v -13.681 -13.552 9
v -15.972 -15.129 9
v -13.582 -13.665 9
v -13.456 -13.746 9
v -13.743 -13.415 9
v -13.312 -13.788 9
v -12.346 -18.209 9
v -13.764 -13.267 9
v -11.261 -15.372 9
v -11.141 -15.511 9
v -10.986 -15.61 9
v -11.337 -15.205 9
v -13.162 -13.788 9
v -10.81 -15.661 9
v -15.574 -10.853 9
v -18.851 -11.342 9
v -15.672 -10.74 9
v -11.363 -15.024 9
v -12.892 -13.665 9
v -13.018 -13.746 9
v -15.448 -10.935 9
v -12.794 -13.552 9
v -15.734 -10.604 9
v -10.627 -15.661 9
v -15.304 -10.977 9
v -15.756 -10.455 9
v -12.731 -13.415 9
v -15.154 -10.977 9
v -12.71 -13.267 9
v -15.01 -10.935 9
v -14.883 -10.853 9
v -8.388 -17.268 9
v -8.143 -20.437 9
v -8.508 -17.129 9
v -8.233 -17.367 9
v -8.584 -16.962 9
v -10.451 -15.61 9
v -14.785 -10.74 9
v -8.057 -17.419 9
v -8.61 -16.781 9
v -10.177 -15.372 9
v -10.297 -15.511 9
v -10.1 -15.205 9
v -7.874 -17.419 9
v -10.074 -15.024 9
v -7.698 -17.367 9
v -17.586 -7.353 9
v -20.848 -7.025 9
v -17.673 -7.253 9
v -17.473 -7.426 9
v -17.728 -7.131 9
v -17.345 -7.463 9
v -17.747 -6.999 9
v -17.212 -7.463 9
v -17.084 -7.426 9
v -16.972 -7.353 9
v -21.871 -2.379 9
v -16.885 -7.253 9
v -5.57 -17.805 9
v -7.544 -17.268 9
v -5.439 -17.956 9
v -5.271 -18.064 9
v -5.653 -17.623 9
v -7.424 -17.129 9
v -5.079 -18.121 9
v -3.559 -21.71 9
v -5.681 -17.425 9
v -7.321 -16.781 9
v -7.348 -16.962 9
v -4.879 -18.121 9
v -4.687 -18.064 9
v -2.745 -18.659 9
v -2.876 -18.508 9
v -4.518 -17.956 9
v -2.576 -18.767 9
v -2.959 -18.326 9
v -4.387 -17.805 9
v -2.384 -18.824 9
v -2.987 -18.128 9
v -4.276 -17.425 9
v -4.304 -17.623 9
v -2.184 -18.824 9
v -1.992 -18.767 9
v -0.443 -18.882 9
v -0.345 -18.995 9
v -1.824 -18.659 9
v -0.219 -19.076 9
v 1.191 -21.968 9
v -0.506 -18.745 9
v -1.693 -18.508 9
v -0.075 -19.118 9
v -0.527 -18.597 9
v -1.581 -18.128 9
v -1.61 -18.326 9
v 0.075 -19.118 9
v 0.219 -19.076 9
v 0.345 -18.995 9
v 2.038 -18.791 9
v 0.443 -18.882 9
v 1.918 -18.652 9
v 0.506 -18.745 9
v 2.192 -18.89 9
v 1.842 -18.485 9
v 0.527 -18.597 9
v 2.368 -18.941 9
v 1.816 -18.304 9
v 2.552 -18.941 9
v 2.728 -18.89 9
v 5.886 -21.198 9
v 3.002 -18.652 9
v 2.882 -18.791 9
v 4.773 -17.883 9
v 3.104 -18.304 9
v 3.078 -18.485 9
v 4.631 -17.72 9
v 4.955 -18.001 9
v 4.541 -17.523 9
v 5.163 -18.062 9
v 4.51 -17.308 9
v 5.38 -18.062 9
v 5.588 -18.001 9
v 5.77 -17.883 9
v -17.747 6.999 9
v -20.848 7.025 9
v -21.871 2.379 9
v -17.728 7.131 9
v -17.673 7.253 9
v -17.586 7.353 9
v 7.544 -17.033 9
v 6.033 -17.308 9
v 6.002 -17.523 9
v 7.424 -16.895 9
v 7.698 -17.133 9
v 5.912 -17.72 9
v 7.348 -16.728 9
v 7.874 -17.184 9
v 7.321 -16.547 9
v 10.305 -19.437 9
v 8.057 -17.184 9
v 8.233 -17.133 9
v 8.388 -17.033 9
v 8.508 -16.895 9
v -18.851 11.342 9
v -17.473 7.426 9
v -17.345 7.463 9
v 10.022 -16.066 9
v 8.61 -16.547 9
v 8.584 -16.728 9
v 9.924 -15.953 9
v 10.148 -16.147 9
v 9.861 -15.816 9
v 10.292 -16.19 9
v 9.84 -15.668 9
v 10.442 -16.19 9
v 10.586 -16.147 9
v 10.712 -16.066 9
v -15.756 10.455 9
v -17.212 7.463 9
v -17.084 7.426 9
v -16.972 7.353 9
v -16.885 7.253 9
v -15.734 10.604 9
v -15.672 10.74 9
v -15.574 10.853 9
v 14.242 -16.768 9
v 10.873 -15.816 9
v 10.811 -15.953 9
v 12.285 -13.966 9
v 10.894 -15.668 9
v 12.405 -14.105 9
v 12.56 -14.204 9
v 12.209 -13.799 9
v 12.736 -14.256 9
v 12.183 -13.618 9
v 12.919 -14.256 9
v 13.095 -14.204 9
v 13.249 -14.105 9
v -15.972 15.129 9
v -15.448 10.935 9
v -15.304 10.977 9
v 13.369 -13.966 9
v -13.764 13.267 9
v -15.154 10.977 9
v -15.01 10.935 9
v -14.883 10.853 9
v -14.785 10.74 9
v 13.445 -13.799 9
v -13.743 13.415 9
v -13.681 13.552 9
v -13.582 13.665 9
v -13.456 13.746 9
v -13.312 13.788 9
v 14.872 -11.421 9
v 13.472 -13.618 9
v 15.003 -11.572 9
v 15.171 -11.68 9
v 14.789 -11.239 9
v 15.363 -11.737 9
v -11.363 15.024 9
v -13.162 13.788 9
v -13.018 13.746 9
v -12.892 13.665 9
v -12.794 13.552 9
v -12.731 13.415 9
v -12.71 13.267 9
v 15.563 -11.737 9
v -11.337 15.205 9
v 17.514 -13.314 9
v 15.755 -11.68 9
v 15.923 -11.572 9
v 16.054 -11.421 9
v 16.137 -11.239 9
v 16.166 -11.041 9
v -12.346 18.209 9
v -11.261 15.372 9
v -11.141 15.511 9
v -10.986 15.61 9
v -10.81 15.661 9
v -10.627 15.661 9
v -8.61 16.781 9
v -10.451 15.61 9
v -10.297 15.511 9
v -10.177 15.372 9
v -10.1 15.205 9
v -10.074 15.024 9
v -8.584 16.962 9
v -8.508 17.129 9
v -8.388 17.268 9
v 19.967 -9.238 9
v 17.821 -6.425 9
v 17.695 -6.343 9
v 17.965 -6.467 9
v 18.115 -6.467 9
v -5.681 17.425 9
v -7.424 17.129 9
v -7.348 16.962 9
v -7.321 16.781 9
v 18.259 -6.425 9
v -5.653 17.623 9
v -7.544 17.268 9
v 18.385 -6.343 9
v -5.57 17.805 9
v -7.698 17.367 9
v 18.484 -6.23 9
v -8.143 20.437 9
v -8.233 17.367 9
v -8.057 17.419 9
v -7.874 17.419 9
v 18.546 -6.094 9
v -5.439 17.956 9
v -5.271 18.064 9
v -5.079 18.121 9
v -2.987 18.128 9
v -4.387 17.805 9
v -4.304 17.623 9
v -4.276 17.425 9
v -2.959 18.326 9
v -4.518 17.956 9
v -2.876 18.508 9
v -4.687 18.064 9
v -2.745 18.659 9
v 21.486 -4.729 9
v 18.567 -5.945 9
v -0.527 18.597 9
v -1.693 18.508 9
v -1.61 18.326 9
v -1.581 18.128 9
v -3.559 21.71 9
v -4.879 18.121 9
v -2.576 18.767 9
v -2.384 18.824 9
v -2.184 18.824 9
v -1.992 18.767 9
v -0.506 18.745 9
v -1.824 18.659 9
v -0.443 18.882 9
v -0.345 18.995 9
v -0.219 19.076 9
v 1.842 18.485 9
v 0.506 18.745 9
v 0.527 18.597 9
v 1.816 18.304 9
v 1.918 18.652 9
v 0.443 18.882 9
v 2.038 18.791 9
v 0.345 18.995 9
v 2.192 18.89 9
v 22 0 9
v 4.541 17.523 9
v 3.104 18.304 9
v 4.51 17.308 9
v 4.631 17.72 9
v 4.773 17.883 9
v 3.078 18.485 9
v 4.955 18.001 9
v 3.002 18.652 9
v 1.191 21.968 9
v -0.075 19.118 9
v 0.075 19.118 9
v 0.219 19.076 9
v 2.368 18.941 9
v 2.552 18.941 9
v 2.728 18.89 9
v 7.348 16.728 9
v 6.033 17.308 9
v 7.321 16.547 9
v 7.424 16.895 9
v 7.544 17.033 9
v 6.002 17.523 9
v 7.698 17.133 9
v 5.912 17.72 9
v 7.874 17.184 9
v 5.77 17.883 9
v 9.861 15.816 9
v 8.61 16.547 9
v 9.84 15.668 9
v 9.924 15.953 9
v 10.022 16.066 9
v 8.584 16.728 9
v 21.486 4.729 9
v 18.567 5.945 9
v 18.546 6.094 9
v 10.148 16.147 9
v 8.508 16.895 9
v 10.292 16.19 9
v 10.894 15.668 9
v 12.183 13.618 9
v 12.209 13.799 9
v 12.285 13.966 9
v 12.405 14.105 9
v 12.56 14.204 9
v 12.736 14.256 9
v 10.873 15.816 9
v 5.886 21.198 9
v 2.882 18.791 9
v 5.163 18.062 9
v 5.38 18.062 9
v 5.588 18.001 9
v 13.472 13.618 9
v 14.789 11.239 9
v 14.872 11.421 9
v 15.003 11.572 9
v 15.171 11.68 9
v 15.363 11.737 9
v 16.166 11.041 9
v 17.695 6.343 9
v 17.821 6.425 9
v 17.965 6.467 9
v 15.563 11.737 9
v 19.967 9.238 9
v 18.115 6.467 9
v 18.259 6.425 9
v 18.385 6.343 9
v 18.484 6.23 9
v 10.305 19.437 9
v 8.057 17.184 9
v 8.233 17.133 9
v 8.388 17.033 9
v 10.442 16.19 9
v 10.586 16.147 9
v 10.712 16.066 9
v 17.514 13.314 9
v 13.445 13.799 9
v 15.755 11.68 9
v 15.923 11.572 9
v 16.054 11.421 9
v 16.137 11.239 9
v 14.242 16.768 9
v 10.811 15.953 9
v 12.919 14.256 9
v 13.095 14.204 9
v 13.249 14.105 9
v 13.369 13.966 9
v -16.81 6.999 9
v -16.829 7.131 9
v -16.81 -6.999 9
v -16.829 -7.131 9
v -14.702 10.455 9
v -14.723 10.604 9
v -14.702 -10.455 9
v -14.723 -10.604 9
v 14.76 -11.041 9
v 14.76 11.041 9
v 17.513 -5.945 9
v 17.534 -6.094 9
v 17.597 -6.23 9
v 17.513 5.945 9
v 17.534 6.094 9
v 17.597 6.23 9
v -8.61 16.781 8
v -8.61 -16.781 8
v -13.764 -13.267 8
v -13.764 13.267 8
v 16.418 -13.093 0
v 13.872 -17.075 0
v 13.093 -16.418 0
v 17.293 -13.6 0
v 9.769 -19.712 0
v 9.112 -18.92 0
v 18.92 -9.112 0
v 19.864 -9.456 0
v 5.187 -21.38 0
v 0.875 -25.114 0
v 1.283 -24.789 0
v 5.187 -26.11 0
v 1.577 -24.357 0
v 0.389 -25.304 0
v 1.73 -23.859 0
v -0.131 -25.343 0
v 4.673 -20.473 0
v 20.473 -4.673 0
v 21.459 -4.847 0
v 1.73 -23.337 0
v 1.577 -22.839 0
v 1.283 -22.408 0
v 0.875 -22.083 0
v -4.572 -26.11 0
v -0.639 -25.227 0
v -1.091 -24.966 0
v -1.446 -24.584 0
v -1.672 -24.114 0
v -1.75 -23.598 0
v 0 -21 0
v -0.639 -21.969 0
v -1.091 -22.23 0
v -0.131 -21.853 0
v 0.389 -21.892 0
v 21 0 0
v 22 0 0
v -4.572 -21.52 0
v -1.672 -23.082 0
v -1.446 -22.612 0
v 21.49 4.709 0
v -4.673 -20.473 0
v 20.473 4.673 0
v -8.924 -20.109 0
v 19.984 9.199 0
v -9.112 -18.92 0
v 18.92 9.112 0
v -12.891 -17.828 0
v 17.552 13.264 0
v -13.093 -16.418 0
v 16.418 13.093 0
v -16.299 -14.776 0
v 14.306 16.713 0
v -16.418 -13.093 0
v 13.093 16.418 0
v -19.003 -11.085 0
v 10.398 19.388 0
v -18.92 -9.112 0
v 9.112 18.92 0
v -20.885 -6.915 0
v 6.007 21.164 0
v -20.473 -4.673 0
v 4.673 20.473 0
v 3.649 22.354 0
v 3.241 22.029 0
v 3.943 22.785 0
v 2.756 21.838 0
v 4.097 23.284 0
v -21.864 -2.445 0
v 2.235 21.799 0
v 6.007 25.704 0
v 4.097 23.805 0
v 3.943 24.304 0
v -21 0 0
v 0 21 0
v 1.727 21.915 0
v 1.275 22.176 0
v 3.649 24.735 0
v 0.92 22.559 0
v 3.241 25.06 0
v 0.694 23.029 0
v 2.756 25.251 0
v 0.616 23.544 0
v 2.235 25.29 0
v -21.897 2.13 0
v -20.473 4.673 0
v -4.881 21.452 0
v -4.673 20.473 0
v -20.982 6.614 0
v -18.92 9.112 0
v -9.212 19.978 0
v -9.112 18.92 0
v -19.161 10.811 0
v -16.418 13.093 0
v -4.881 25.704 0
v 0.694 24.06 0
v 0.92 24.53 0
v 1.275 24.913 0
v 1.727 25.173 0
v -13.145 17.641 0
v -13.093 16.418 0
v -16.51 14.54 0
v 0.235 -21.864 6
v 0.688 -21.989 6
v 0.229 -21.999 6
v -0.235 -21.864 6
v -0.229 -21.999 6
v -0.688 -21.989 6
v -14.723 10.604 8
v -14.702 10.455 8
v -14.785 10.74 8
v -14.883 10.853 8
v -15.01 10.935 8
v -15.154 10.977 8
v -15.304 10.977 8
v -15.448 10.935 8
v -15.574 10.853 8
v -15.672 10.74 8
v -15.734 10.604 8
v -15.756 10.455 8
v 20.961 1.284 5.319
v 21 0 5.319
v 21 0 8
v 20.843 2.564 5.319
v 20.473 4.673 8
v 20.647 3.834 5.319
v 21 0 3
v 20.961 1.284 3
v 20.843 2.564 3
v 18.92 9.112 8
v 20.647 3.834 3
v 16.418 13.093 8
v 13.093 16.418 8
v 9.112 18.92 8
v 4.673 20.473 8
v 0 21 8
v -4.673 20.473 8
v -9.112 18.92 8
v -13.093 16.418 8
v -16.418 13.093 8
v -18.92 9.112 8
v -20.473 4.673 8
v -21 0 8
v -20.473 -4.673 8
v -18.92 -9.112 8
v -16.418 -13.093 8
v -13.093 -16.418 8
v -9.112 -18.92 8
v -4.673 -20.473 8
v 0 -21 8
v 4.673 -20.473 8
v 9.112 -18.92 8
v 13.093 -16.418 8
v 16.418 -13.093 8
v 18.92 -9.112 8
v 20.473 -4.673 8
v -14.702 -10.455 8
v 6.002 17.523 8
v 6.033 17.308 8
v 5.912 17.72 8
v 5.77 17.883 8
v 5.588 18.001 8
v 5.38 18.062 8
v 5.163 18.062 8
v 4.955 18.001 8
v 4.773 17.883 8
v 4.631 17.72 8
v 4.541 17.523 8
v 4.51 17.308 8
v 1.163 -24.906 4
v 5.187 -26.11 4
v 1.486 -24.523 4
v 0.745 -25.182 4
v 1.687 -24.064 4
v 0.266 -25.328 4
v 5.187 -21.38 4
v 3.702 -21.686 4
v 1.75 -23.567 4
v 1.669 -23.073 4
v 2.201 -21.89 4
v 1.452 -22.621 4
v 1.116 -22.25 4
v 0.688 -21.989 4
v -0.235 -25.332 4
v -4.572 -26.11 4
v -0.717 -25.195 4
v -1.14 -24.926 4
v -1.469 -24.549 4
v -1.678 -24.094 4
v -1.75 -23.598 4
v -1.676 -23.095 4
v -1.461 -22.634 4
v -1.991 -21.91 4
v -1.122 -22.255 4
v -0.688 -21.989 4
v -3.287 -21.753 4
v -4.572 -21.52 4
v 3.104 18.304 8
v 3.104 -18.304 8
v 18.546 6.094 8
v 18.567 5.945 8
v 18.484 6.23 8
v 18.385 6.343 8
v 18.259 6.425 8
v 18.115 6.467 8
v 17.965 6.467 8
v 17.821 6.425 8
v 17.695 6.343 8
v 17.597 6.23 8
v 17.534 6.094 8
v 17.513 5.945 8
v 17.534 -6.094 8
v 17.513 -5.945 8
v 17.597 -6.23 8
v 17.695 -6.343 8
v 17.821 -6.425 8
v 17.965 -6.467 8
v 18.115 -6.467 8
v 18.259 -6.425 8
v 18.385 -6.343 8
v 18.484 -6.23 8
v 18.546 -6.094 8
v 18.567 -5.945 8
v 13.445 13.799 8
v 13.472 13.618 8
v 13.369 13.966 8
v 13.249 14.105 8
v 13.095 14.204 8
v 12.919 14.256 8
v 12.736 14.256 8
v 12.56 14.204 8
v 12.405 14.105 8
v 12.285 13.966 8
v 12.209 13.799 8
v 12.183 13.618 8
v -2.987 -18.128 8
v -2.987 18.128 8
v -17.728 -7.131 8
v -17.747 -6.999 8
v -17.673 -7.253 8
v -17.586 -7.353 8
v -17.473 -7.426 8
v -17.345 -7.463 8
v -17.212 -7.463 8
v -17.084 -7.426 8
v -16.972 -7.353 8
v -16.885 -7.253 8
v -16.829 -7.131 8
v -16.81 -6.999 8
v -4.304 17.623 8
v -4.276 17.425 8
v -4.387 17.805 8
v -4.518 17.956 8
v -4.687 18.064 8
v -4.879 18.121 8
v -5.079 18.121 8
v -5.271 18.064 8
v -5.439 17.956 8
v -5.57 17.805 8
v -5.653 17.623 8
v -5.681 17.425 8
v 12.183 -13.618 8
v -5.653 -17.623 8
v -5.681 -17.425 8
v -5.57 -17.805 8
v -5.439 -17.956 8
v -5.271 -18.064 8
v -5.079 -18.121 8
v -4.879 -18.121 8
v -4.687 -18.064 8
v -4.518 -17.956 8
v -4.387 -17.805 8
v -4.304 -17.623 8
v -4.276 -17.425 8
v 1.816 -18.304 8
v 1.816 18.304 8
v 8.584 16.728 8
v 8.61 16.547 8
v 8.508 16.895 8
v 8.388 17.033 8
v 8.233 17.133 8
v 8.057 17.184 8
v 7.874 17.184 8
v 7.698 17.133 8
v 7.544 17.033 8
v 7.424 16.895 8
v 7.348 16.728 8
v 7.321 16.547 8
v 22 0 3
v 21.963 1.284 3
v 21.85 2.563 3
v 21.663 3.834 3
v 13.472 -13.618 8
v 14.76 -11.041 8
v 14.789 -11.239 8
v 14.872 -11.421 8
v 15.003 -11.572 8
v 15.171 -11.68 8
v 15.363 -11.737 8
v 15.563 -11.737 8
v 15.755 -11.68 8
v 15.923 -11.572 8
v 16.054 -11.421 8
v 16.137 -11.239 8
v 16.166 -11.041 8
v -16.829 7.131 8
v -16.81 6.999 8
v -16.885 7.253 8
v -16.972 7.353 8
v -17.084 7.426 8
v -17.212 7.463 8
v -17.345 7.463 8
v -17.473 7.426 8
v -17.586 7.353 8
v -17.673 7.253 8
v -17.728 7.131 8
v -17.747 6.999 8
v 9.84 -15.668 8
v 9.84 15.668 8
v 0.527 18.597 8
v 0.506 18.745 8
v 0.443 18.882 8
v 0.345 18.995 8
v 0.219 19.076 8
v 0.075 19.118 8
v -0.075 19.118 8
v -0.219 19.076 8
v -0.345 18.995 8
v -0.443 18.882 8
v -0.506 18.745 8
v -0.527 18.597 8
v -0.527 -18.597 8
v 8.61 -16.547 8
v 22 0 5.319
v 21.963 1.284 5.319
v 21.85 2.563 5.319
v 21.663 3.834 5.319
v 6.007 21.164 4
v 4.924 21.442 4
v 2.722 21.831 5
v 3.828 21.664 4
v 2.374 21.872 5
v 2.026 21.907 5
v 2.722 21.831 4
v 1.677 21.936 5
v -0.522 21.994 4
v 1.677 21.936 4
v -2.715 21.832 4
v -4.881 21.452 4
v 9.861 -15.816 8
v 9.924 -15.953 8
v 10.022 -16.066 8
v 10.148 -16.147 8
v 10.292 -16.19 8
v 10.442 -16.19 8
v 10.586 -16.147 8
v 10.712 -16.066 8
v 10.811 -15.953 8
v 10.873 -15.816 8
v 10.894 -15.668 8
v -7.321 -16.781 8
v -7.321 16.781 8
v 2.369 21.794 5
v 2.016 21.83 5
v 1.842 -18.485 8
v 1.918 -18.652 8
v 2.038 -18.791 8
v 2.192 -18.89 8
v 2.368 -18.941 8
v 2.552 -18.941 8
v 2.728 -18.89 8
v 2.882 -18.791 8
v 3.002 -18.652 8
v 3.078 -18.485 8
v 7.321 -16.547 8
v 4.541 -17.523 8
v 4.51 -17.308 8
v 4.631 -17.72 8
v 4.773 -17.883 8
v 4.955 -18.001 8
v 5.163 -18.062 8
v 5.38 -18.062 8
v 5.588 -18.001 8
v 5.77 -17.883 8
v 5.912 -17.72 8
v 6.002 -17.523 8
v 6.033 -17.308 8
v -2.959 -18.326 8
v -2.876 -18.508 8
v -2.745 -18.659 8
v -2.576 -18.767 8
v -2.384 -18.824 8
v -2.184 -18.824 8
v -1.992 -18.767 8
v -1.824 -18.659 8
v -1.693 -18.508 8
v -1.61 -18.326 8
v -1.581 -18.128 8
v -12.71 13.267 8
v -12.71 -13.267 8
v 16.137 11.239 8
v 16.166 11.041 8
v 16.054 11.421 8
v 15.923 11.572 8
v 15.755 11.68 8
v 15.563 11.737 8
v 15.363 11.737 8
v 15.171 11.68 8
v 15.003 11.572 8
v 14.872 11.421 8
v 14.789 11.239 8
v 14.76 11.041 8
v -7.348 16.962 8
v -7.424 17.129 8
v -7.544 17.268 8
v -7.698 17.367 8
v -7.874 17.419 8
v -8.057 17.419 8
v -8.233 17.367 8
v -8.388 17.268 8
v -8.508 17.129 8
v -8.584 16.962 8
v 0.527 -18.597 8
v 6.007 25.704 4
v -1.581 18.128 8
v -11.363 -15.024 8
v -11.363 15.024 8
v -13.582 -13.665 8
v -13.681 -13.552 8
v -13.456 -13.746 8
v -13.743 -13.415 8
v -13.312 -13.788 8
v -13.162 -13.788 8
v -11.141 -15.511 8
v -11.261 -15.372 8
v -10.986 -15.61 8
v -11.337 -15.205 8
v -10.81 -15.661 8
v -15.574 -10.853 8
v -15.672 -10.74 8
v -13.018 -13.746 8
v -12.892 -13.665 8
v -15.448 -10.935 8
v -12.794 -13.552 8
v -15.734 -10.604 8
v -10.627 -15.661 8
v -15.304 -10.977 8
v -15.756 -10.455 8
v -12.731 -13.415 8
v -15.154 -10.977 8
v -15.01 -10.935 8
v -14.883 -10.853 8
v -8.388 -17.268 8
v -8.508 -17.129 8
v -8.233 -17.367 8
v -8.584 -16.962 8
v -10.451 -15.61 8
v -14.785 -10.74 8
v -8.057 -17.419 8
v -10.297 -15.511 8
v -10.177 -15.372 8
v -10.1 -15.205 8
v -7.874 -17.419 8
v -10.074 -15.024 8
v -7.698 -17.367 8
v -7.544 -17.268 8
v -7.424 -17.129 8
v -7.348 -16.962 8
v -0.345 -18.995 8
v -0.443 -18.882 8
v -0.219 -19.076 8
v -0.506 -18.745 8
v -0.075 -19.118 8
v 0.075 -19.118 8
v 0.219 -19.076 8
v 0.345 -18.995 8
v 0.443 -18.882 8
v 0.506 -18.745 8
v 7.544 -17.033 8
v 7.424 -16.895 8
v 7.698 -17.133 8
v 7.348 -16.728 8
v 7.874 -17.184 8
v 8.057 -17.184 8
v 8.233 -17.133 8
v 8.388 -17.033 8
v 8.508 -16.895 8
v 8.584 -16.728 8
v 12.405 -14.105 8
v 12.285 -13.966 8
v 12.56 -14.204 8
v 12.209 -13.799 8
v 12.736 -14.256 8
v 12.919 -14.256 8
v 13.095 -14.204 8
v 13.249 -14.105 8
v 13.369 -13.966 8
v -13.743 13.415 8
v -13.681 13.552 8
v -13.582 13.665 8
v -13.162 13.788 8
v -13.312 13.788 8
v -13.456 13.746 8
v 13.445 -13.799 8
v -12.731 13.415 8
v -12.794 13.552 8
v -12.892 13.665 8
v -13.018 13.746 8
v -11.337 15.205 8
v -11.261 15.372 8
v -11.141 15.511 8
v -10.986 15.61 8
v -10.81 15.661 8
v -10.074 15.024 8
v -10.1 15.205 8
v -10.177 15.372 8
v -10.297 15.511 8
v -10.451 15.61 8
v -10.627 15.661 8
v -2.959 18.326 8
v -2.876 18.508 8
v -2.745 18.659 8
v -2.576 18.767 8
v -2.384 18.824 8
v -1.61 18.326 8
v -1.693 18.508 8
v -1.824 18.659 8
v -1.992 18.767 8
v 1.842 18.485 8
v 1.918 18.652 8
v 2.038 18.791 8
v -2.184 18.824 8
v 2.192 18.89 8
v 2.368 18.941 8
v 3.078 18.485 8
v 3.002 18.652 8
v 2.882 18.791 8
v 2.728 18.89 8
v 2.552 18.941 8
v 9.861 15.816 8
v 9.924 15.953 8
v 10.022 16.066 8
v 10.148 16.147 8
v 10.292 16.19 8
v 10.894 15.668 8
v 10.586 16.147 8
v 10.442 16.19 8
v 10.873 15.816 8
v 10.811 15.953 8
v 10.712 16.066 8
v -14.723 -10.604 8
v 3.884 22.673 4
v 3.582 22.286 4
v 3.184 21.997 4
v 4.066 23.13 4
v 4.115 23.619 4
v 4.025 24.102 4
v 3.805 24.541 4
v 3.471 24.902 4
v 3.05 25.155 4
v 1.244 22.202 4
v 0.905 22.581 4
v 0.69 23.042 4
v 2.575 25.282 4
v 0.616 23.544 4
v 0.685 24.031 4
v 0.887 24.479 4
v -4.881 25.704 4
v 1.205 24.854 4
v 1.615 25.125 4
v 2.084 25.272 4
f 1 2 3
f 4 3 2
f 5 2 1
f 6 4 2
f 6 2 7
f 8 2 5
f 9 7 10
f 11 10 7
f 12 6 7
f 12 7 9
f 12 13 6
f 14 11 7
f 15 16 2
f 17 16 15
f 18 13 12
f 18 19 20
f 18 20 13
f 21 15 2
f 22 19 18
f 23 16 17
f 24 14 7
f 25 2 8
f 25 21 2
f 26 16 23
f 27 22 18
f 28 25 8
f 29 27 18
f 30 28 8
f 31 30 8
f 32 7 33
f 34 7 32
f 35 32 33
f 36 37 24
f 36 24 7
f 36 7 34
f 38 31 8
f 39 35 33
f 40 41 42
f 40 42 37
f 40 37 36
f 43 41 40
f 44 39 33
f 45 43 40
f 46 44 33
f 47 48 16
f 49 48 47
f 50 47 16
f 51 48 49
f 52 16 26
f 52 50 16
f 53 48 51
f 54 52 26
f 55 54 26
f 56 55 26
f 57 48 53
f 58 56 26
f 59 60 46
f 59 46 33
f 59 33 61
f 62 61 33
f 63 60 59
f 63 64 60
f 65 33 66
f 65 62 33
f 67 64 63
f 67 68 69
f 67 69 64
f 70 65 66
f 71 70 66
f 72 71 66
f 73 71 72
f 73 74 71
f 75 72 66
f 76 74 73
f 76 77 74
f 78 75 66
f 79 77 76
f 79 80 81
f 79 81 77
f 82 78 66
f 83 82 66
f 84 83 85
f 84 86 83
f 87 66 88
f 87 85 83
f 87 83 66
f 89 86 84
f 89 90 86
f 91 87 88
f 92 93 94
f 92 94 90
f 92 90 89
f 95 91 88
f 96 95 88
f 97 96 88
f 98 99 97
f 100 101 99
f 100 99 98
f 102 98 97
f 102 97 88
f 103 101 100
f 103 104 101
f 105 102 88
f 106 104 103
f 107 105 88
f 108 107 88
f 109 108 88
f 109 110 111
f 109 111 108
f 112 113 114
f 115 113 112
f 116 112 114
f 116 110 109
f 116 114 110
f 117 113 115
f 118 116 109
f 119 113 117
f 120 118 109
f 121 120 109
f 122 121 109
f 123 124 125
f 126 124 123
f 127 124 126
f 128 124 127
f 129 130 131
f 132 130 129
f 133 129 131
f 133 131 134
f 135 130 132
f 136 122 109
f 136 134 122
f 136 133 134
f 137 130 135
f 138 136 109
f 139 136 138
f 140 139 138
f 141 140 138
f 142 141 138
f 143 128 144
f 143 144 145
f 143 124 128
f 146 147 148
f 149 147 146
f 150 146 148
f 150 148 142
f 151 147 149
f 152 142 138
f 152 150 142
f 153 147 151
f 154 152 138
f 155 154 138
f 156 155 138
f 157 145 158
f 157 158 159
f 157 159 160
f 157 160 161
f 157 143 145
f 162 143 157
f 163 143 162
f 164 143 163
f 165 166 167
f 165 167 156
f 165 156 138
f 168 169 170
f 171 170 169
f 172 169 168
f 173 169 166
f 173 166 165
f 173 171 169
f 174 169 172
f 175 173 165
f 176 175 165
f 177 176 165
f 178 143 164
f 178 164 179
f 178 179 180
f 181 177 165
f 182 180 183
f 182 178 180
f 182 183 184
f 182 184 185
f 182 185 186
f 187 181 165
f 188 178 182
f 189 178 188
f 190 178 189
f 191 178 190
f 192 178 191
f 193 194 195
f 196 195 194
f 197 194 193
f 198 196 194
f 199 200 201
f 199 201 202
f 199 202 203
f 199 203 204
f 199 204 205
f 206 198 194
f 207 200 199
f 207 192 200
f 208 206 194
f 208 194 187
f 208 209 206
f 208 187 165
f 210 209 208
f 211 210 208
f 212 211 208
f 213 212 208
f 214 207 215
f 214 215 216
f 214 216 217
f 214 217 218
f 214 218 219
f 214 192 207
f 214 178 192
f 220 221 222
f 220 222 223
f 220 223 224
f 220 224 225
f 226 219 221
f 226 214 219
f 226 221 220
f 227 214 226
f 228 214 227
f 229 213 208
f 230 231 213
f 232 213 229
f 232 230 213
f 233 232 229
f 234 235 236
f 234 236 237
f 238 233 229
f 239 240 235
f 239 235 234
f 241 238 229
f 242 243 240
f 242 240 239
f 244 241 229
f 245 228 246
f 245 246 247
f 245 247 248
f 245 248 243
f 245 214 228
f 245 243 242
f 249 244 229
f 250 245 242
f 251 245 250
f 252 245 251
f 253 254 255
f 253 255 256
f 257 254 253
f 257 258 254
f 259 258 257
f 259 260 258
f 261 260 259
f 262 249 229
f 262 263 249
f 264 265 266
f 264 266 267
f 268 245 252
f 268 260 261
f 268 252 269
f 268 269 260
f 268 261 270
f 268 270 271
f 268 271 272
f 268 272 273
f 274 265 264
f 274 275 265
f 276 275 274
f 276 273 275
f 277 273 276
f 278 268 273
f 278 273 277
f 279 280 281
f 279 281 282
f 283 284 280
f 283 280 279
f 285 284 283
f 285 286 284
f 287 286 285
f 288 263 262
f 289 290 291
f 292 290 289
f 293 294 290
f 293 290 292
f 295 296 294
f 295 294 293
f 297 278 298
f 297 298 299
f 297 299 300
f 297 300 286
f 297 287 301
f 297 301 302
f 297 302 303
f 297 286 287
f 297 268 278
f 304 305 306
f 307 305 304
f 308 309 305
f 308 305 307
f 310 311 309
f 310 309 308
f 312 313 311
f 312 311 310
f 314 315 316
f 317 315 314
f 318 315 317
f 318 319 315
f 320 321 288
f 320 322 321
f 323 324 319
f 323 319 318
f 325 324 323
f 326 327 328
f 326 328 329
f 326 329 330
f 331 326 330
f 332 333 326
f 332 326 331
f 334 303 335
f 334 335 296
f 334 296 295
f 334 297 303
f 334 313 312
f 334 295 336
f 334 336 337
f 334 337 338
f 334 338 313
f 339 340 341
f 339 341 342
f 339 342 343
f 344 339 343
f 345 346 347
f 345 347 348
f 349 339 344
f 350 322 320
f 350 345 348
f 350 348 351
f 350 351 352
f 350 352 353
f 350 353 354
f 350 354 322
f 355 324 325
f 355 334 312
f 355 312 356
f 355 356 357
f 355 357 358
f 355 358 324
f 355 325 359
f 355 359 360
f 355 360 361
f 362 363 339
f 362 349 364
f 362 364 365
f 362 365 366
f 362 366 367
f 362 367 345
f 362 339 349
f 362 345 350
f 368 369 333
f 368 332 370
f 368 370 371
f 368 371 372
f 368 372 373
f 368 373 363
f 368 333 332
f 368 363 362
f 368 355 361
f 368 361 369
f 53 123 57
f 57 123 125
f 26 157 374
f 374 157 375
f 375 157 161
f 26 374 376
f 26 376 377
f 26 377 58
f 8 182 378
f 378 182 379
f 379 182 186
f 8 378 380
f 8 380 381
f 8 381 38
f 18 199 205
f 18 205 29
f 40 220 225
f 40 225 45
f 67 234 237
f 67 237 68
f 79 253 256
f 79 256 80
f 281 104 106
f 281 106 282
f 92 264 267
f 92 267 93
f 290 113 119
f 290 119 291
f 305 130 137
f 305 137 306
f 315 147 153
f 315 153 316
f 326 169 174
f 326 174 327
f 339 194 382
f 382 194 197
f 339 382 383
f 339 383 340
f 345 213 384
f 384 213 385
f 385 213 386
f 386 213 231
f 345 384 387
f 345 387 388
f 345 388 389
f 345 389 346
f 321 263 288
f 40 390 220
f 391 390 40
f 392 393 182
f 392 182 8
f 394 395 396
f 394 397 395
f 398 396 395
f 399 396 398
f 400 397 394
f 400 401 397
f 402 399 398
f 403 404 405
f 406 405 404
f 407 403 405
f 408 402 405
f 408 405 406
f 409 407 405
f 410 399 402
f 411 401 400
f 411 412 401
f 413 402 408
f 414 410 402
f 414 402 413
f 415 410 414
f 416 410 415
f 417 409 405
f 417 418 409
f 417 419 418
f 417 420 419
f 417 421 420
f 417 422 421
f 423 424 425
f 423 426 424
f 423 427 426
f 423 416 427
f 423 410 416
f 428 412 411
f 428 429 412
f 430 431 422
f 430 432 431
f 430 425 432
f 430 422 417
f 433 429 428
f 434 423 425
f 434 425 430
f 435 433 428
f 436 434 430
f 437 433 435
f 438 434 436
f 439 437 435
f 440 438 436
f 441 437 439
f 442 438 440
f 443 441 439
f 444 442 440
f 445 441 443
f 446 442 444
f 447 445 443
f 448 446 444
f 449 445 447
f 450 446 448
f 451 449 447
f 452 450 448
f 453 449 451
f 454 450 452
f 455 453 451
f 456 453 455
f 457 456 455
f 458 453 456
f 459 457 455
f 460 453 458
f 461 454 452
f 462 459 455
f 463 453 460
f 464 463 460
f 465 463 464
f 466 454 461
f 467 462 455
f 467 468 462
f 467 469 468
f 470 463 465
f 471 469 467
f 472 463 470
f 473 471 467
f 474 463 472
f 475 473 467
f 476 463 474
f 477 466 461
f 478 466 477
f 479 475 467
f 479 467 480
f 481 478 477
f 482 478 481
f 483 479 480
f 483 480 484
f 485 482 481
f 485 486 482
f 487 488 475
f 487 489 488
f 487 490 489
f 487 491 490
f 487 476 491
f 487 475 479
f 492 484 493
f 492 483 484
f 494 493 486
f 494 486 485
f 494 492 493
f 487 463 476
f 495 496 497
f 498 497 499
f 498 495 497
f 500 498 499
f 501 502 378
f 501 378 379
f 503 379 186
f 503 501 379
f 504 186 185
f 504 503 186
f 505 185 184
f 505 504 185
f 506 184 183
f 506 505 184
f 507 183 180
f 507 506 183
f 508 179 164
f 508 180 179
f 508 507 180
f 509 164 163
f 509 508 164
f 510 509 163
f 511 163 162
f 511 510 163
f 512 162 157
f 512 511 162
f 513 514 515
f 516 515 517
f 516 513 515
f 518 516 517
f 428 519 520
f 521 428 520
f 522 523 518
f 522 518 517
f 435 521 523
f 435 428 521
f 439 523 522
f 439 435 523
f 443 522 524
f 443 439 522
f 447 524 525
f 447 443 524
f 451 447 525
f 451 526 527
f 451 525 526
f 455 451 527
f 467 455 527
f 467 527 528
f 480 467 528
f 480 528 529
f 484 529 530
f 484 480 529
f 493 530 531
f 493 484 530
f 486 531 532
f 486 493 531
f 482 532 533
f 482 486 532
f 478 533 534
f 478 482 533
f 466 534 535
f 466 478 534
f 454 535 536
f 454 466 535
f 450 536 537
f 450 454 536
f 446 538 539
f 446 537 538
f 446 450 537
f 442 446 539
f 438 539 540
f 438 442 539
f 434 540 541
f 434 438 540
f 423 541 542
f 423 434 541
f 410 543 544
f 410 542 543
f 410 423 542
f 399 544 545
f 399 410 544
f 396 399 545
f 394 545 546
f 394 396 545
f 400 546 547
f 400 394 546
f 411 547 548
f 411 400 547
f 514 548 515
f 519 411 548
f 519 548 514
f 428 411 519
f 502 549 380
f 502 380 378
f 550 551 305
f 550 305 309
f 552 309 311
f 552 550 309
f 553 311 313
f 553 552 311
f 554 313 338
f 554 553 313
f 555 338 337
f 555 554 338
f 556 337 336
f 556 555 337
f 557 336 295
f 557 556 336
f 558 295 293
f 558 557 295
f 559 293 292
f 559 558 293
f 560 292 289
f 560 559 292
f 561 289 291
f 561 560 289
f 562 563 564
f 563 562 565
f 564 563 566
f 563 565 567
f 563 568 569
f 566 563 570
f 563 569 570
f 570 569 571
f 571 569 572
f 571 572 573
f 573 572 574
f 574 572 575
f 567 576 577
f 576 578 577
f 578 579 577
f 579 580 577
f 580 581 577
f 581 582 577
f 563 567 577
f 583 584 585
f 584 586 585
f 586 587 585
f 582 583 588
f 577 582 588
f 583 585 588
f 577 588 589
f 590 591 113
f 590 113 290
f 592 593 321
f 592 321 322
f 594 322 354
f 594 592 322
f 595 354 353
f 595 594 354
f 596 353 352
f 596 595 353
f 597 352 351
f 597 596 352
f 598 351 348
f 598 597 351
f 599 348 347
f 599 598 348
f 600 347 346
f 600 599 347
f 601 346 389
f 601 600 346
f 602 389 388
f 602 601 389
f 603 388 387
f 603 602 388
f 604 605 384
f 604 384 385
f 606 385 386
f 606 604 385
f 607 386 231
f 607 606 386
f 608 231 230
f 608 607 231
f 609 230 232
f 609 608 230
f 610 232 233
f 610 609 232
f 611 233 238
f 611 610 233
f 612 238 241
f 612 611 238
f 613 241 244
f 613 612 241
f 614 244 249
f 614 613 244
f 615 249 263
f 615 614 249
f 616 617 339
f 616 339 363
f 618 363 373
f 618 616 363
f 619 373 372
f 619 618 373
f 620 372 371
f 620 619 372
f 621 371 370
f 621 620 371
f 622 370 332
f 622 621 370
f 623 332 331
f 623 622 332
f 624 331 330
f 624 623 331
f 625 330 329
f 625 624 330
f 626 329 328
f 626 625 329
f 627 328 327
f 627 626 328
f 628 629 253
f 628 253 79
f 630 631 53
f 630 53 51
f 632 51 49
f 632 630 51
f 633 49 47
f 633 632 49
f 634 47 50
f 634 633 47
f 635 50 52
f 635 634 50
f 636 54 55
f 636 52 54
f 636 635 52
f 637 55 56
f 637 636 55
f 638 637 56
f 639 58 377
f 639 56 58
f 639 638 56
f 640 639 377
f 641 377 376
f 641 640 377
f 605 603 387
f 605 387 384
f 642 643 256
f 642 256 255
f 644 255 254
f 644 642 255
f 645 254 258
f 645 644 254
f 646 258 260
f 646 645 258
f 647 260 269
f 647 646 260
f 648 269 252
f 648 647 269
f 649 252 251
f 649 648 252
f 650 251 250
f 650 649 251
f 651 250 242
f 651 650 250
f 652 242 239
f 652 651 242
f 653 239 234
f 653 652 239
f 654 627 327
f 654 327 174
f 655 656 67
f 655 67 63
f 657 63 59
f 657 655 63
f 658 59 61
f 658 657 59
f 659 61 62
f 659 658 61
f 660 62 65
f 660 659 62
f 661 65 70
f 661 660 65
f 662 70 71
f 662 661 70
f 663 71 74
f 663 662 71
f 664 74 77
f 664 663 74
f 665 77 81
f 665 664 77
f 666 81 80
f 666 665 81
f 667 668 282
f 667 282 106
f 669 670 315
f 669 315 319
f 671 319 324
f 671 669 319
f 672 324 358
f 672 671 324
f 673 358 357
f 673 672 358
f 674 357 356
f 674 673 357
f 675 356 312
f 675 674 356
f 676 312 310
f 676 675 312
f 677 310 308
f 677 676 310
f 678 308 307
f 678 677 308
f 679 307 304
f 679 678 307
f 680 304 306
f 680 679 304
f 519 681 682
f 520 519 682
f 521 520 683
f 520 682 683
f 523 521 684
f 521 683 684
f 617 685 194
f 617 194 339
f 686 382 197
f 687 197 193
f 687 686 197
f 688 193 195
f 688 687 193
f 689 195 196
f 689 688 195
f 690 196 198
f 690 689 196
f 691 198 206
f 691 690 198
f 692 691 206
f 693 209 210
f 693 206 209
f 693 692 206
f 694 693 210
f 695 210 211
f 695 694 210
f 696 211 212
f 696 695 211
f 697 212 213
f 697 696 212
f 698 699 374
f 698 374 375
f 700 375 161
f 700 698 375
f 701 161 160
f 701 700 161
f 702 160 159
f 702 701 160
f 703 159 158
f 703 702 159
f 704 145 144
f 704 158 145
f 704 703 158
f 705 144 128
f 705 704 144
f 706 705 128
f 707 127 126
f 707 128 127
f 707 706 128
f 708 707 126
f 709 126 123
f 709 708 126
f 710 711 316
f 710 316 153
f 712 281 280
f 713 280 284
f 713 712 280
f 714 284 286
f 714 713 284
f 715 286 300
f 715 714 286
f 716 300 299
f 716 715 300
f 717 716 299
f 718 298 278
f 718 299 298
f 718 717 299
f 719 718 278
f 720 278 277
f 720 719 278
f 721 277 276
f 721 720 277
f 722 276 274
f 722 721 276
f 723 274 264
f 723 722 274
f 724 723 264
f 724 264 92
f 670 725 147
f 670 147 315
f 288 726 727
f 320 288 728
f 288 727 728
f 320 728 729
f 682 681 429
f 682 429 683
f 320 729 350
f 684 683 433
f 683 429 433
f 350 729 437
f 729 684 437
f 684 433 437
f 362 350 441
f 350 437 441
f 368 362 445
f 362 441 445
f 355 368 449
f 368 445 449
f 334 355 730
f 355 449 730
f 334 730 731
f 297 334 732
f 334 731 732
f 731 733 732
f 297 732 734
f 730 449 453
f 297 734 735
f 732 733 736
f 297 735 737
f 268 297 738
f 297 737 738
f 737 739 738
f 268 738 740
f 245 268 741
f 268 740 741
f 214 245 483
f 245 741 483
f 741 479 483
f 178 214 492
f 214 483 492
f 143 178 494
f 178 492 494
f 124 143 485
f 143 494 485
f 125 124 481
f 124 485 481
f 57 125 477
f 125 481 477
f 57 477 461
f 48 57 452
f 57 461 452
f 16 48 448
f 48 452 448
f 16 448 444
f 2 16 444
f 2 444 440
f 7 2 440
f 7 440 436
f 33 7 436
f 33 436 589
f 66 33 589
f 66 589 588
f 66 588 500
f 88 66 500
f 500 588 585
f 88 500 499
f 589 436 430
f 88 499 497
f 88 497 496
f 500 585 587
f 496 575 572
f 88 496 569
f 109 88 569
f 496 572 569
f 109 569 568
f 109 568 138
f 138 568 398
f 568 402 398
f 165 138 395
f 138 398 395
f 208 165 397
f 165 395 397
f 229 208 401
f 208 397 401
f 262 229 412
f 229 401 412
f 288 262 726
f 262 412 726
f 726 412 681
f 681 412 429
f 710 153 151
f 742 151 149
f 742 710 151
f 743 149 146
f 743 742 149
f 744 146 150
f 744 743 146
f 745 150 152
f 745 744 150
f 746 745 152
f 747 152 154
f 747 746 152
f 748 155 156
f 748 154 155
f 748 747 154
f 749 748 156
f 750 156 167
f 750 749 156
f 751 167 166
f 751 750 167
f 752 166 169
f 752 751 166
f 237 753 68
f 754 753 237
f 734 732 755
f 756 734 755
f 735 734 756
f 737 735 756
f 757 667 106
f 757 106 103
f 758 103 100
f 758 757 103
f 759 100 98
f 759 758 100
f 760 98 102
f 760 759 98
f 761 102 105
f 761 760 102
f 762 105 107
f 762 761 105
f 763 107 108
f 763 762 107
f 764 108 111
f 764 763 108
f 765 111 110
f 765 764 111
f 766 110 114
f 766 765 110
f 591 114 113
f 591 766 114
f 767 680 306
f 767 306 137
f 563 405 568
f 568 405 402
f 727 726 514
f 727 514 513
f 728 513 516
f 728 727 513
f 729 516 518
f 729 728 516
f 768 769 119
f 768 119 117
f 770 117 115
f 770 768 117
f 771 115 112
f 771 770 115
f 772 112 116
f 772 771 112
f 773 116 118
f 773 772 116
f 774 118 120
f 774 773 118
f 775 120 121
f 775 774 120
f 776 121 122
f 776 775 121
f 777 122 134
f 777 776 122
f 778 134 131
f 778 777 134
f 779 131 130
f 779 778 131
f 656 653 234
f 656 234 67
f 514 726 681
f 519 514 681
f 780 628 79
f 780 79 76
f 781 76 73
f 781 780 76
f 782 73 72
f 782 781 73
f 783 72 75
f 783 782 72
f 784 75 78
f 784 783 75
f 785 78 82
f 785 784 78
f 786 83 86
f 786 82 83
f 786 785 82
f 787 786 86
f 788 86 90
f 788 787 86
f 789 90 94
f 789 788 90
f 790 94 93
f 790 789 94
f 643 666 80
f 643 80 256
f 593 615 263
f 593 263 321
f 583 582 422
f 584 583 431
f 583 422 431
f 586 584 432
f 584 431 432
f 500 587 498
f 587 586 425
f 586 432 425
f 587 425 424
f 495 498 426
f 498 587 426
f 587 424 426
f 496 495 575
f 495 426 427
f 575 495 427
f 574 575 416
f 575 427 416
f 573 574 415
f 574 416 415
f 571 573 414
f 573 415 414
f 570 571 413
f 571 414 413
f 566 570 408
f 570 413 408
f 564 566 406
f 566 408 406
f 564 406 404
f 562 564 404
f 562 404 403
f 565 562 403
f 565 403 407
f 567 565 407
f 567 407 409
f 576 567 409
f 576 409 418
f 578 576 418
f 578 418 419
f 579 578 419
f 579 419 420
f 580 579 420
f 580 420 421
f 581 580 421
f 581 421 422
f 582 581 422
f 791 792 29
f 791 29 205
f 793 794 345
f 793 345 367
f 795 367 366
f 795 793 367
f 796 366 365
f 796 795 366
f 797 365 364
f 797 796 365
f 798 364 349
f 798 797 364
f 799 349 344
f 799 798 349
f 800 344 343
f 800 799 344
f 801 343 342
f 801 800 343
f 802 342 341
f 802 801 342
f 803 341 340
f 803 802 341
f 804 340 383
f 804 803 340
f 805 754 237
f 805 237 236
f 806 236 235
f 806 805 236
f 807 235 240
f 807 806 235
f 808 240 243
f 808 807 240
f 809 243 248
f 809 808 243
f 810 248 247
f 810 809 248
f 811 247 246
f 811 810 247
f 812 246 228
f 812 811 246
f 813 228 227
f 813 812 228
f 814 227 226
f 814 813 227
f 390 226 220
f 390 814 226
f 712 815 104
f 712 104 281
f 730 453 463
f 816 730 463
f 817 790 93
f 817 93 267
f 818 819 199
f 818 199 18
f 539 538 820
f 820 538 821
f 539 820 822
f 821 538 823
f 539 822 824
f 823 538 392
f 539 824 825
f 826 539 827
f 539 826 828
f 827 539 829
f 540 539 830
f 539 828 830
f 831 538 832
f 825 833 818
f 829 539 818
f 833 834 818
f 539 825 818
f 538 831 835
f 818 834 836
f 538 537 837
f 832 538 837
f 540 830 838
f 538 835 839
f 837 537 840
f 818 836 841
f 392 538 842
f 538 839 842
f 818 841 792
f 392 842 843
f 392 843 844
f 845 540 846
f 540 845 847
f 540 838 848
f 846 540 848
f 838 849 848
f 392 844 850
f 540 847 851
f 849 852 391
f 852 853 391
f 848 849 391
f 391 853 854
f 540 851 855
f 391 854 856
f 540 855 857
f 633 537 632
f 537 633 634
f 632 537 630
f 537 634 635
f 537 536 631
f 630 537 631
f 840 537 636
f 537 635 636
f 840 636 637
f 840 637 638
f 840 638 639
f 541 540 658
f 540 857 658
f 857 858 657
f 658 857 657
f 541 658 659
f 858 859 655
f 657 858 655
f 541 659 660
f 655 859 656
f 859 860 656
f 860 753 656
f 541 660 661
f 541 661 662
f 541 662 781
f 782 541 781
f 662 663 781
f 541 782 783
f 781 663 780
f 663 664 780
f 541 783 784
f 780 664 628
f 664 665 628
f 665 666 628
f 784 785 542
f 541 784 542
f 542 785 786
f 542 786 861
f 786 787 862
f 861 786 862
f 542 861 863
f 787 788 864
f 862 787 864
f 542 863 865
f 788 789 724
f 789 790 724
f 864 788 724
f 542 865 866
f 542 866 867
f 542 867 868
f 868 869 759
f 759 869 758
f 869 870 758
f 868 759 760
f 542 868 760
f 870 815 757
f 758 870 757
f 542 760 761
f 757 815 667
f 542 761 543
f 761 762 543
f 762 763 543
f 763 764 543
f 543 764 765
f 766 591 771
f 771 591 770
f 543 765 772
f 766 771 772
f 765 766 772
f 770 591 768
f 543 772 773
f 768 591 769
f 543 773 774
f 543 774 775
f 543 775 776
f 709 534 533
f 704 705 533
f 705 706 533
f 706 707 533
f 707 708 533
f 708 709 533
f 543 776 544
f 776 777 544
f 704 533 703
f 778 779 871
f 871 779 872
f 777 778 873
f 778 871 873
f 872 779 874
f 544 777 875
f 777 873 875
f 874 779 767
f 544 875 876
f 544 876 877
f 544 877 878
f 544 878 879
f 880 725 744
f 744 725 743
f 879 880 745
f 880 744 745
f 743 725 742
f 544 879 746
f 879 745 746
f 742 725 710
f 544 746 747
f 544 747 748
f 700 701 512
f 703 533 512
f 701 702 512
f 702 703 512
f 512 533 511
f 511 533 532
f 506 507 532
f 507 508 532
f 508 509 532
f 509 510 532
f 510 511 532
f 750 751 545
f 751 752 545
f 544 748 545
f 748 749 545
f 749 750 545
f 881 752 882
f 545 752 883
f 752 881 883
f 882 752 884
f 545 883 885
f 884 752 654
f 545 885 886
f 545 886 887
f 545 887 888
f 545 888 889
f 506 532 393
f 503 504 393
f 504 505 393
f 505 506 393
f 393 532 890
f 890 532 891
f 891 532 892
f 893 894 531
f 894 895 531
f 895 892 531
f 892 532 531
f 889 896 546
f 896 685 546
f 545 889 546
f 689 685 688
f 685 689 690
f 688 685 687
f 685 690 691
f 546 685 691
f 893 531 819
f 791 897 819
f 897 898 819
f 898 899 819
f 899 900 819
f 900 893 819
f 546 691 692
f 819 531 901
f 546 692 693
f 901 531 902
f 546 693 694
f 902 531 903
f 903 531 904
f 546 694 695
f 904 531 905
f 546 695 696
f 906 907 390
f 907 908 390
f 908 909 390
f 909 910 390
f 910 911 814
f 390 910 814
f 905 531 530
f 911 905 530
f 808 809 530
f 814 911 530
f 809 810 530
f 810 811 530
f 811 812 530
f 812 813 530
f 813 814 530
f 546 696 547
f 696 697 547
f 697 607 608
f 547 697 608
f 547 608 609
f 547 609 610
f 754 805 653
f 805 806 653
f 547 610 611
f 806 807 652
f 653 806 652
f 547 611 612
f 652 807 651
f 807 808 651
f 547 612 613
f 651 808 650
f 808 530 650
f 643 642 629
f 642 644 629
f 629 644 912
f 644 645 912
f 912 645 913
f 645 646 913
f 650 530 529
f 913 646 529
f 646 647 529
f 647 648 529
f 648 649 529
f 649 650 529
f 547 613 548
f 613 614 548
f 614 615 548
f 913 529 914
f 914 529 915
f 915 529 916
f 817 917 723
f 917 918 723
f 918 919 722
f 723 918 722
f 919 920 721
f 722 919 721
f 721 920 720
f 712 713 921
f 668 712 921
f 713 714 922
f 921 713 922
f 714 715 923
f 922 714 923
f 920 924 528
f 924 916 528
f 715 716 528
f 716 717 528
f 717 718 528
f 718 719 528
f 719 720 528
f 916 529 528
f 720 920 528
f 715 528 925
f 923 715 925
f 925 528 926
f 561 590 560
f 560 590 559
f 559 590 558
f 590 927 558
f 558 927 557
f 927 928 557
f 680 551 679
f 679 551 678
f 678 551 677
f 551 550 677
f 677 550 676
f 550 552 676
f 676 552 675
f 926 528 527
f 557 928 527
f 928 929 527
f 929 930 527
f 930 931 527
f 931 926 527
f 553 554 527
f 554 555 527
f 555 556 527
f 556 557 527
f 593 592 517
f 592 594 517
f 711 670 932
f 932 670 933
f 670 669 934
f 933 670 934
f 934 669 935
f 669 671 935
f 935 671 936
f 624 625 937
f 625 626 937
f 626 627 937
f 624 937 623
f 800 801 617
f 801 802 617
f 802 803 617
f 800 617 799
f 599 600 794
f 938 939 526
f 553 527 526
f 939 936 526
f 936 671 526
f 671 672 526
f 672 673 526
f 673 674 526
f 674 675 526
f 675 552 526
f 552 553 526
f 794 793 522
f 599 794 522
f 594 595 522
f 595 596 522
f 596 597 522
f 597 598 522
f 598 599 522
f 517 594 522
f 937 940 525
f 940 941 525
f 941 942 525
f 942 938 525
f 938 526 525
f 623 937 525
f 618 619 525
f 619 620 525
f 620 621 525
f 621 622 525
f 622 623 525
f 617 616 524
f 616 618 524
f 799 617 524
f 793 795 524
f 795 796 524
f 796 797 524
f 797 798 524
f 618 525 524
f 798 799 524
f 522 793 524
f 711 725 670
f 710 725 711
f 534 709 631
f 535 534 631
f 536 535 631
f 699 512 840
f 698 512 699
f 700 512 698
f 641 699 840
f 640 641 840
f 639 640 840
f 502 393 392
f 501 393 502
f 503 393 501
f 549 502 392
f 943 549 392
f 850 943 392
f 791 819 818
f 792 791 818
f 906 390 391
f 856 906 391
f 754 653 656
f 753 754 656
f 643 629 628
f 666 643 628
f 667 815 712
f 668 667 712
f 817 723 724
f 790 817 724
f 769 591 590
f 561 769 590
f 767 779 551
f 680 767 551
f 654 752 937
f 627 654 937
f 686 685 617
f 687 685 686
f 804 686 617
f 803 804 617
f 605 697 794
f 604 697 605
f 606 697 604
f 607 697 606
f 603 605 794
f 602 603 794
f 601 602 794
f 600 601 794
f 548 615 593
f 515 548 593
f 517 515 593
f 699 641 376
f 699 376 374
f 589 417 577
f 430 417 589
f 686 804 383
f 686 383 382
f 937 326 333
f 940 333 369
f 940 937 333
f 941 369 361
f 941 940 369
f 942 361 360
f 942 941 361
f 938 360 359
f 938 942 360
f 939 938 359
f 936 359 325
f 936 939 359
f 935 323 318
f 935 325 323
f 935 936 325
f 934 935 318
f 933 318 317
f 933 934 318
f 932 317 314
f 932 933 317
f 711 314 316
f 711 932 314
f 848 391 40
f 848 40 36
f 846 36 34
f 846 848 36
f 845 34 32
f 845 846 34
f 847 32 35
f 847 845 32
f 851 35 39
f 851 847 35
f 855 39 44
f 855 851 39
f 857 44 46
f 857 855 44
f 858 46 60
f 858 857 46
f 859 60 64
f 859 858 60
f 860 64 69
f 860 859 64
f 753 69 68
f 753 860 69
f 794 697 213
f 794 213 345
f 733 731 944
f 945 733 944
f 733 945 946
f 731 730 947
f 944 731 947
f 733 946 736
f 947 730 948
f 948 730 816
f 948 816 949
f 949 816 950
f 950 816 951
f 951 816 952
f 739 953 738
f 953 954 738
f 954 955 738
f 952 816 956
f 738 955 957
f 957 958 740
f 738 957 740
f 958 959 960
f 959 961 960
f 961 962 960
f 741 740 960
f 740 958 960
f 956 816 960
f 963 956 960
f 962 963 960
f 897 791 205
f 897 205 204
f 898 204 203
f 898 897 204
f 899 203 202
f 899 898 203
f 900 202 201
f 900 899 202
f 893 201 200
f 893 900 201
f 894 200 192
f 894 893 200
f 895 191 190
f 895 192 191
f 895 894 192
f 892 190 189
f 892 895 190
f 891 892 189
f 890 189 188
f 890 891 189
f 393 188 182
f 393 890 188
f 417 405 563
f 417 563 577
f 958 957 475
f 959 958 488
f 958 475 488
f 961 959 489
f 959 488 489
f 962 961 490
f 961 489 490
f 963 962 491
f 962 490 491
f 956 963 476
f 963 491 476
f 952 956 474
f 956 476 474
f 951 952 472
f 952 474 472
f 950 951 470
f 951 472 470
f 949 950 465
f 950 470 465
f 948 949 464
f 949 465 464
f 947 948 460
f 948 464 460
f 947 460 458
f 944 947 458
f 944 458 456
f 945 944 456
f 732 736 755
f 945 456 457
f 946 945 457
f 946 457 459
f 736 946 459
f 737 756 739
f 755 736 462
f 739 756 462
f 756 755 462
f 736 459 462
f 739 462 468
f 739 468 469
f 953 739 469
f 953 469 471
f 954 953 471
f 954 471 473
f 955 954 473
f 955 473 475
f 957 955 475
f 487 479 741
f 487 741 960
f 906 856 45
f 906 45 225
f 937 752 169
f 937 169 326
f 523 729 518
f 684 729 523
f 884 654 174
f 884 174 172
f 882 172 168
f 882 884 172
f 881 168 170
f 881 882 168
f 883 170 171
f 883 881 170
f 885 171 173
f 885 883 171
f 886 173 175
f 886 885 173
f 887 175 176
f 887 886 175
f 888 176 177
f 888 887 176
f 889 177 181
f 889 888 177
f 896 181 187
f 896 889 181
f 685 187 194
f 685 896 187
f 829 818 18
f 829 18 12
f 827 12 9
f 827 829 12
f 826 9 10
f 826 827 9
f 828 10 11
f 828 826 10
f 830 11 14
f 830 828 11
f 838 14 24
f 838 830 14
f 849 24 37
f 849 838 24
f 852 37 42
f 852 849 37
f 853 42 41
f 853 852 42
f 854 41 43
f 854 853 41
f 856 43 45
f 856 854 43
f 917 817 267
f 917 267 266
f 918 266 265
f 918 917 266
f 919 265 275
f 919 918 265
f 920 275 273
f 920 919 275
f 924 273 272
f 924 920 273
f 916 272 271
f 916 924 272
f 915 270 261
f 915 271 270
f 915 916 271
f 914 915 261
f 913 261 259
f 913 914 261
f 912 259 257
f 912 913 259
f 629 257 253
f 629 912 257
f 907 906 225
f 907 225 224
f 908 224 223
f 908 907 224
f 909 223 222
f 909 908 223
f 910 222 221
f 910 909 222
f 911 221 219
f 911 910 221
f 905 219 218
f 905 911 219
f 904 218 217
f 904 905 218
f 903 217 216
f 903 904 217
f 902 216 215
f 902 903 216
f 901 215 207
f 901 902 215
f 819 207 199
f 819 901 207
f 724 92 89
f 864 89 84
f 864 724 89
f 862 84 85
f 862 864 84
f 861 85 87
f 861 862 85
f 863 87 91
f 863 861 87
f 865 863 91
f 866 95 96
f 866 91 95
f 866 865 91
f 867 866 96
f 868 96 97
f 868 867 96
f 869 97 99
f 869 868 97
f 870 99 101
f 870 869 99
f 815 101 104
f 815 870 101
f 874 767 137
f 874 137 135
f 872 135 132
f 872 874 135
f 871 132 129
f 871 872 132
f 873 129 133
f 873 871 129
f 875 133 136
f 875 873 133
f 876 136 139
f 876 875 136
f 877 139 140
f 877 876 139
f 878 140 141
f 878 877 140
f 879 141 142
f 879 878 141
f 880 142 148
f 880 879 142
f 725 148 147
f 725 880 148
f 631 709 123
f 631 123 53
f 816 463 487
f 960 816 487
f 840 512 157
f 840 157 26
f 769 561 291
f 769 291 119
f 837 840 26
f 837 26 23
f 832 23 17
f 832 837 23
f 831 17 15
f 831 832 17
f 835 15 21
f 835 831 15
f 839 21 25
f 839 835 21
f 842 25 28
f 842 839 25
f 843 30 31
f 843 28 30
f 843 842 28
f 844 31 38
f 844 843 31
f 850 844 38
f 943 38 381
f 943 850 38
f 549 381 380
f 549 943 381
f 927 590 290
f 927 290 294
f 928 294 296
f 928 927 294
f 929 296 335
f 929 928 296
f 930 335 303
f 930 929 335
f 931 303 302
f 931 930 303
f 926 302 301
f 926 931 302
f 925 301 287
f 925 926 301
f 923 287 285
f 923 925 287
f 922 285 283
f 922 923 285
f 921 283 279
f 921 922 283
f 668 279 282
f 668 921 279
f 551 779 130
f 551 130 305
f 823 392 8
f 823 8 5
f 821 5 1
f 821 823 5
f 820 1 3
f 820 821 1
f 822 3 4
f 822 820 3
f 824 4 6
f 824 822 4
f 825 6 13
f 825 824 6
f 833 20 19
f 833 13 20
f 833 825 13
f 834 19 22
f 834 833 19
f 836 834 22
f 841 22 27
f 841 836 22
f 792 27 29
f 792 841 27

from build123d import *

# Parameters (mm, degrees)
SKETCH1_R           = 22
BOSS_EXTRUDE1_DEPTH = 9
SHELL2_T            = -1
CUT_EXTRUDE1_DEPTH  = 5
CUT_EXTRUDE2_DEPTH  = 5
SKETCH24_W          = 2.319445398
SKETCH24_H          = 3.83352781
CUT_EXTRUDE3_DEPTH  = 5
SKETCH25_W          = 10.887577437
SKETCH25_H          = 4.540244535
BOSS_EXTRUDE2_DEPTH = 4
SKETCH26_R          = 1.75
CUT_EXTRUDE4_DEPTH  = 5
SKETCH27_W          = 9.75823175
SKETCH27_H          = 4.730401218
BOSS_EXTRUDE3_DEPTH = 4
SKETCH28_R          = 1.75
CUT_EXTRUDE5_DEPTH  = 6


with BuildPart() as part:
    # Sketch1 → Boss-Extrude1 (new body)
    with BuildSketch(Plane.XY):
        Circle(SKETCH1_R)
    extrude(amount=BOSS_EXTRUDE1_DEPTH)

    # Shell2
    shell2_openings = [part.faces().sort_by_distance(p)[0] for p in [
        (0, 0, 0),
    ]]
    offset(amount=SHELL2_T, openings=shell2_openings, kind=Kind.INTERSECTION)

    # Sketch23 → Cut-Extrude1 (cut)
    with BuildSketch(Plane(origin=(0, 0, 8), x_dir=(-1, 0, 0), z_dir=(0, 0, -1))):
        with BuildLine():
            Line((-3.104308234, -18.303704212), (-3.104308234, 18.303704212))
            ThreePointArc((-3.104308234, 18.303704212), (-2.460017846, 18.9479946), (-1.815727458, 18.303704212))
            Line((-1.815727458, 18.303704212), (-1.815727458, -18.303704212))
            ThreePointArc((-1.815727458, -18.303704212), (-2.460017846, -18.9479946), (-3.104308234, -18.303704212))
        make_face()
        with BuildLine():
            Line((-6.032900908, -17.307982703), (-6.032900908, 17.307982703))
            ThreePointArc((-6.032900908, 17.307982703), (-5.271466813, 18.069416798), (-4.510032718, 17.307982703))
            Line((-4.510032718, 17.307982703), (-4.510032718, -17.307982703))
            ThreePointArc((-4.510032718, -17.307982703), (-5.271466813, -18.069416798), (-6.032900908, -17.307982703))
        make_face()
        with BuildLine():
            Line((-8.610062461, -16.546548608), (-8.610062461, 16.546548608))
            ThreePointArc((-8.610062461, 16.546548608), (-7.965772073, 17.190838996), (-7.321481685, 16.546548608))
            Line((-7.321481685, 16.546548608), (-7.321481685, -16.546548608))
            ThreePointArc((-7.321481685, -16.546548608), (-7.965772073, -17.190838996), (-8.610062461, -16.546548608))
        make_face()
        with BuildLine():
            Line((-10.894364747, -15.667970806), (-10.894364747, 15.667970806))
            ThreePointArc((-10.894364747, 15.667970806), (-10.367218066, 16.195117487), (-9.840071384, 15.667970806))
            Line((-9.840071384, 15.667970806), (-9.840071384, -15.667970806))
            ThreePointArc((-9.840071384, -15.667970806), (-10.367218066, -16.195117487), (-10.894364747, -15.667970806))
        make_face()
        with BuildLine():
            Line((-13.4715263, -13.617955934), (-13.4715263, 13.617955934))
            ThreePointArc((-13.4715263, 13.617955934), (-12.827235912, 14.262246322), (-12.182945524, 13.617955934))
            Line((-12.182945524, 13.617955934), (-12.182945524, -13.617955934))
            ThreePointArc((-12.182945524, -13.617955934), (-12.827235912, -14.262246322), (-13.4715263, -13.617955934))
        make_face()
        with BuildLine():
            Line((-16.16583156, -11.040794381), (-16.16583156, 11.040794381))
            ThreePointArc((-16.16583156, 11.040794381), (-15.462969318, 11.743656623), (-14.760107077, 11.040794381))
            Line((-14.760107077, 11.040794381), (-14.760107077, -11.040794381))
            ThreePointArc((-14.760107077, -11.040794381), (-15.462969318, -11.743656623), (-16.16583156, -11.040794381))
        make_face()
        with BuildLine():
            Line((-18.567277553, -5.945043128), (-18.567277553, 5.945043128))
            ThreePointArc((-18.567277553, 5.945043128), (-18.040130871, 6.472189809), (-17.51298419, 5.945043128))
            Line((-17.51298419, 5.945043128), (-17.51298419, -5.945043128))
            ThreePointArc((-17.51298419, -5.945043128), (-18.040130871, -6.472189809), (-18.567277553, -5.945043128))
        make_face()
    extrude(amount=-CUT_EXTRUDE1_DEPTH, mode=Mode.SUBTRACT)

    # Sketch22 → Cut-Extrude2 (cut)
    with BuildSketch(Plane(origin=(0, 0, 8), x_dir=(-1, 0, 0), z_dir=(0, 0, -1))):
        with BuildLine():
            Line((-0.527146681, -18.59656348), (-0.527146681, 18.59656348))
            ThreePointArc((-0.527146681, 18.59656348), (0, 19.123710161), (0.527146681, 18.59656348))
            Line((0.527146681, 18.59656348), (0.527146681, -18.59656348))
            ThreePointArc((0.527146681, -18.59656348), (0, -19.123710161), (-0.527146681, -18.59656348))
        make_face()
        with BuildLine():
            Line((1.581440044, -18.127988652), (1.581440044, 18.127988652))
            ThreePointArc((1.581440044, 18.127988652), (2.284302286, 18.830850893), (2.987164527, 18.127988652))
            Line((2.987164527, 18.127988652), (2.987164527, -18.127988652))
            ThreePointArc((2.987164527, -18.127988652), (2.284302286, -18.830850893), (1.581440044, -18.127988652))
        make_face()
        with BuildLine():
            Line((4.275745304, -17.42512641), (4.275745304, 17.42512641))
            ThreePointArc((4.275745304, 17.42512641), (4.978607546, 18.127988652), (5.681469787, 17.42512641))
            Line((5.681469787, 17.42512641), (5.681469787, -17.42512641))
            ThreePointArc((5.681469787, -17.42512641), (4.978607546, -18.127988652), (4.275745304, -17.42512641))
        make_face()
        with BuildLine():
            Line((7.321481685, -16.780836022), (7.321481685, 16.780836022))
            ThreePointArc((7.321481685, 16.780836022), (7.965772073, 17.42512641), (8.610062461, 16.780836022))
            Line((8.610062461, 16.780836022), (8.610062461, -16.780836022))
            ThreePointArc((8.610062461, -16.780836022), (7.965772073, -17.42512641), (7.321481685, -16.780836022))
        make_face()
        with BuildLine():
            Line((10.074358798, -15.023680417), (10.074358798, 15.023680417))
            ThreePointArc((10.074358798, 15.023680417), (10.718649187, 15.667970806), (11.362939575, 15.023680417))
            Line((11.362939575, 15.023680417), (11.362939575, -15.023680417))
            ThreePointArc((11.362939575, -15.023680417), (10.718649187, -15.667970806), (10.074358798, -15.023680417))
        make_face()
        with BuildLine():
            Line((12.710092205, -13.266524813), (12.710092205, 13.266524813))
            ThreePointArc((12.710092205, 13.266524813), (13.237238886, 13.793671494), (13.764385568, 13.266524813))
            Line((13.764385568, 13.266524813), (13.764385568, -13.266524813))
            ThreePointArc((13.764385568, -13.266524813), (13.237238886, -13.793671494), (12.710092205, -13.266524813))
        make_face()
        with BuildLine():
            Line((14.701535223, -10.455075846), (14.701535223, 10.455075846))
            ThreePointArc((14.701535223, 10.455075846), (15.228681905, 10.982222527), (15.755828586, 10.455075846))
            Line((15.755828586, 10.455075846), (15.755828586, -10.455075846))
            ThreePointArc((15.755828586, -10.455075846), (15.228681905, -10.982222527), (14.701535223, -10.455075846))
        make_face()
        with BuildLine():
            Line((16.810121948, -6.999336491), (16.810121948, 6.999336491))
            ThreePointArc((16.810121948, 6.999336491), (17.278696776, 7.467911319), (17.747271604, 6.999336491))
            Line((17.747271604, 6.999336491), (17.747271604, -6.999336491))
            ThreePointArc((17.747271604, -6.999336491), (17.278696776, -7.467911319), (16.810121948, -6.999336491))
        make_face()
    extrude(amount=-CUT_EXTRUDE2_DEPTH, mode=Mode.SUBTRACT)

    # Sketch24 → Cut-Extrude3 (cut)
    with BuildSketch(Plane(origin=(22, 0, 0), x_dir=(0, 0, -1), z_dir=(1, 0, 0))):
        with Locations((-4.159722699, 1.916763905)):
            Rectangle(SKETCH24_W, SKETCH24_H)
    extrude(amount=-CUT_EXTRUDE3_DEPTH, mode=Mode.SUBTRACT)

    # Sketch25 → Boss-Extrude2 (add)
    with BuildSketch(Plane(origin=(0, 0, 0), x_dir=(-1, 0, 0), z_dir=(0, 0, -1))):
        with Locations((-0.56321323, 23.434146639)):
            Rectangle(SKETCH25_W, SKETCH25_H)
    extrude(amount=-BOSS_EXTRUDE2_DEPTH)

    # Sketch26 → Cut-Extrude4 (cut)
    with BuildSketch(Plane(origin=(0, 0, 0), x_dir=(-1, 0, 0), z_dir=(0, 0, -1))):
        with Locations((-2.366226378, 23.54446207)):
            Circle(SKETCH26_R)
    extrude(amount=-CUT_EXTRUDE4_DEPTH, mode=Mode.SUBTRACT)

    # Sketch27 → Boss-Extrude3 (add)
    with BuildSketch(Plane(origin=(0, 0, 0), x_dir=(-1, 0, 0), z_dir=(0, 0, -1))):
        with Locations((-0.307450986, -23.745086582)):
            Rectangle(SKETCH27_W, SKETCH27_H)
    extrude(amount=-BOSS_EXTRUDE3_DEPTH)

    # Sketch28 → Cut-Extrude5 (cut)
    with BuildSketch(Plane(origin=(0, 0, 0), x_dir=(-1, 0, 0), z_dir=(0, 0, -1))):
        with Locations((0, -23.598199513)):
            Circle(SKETCH28_R)
    extrude(amount=-CUT_EXTRUDE5_DEPTH, mode=Mode.SUBTRACT)


solid = part.part
